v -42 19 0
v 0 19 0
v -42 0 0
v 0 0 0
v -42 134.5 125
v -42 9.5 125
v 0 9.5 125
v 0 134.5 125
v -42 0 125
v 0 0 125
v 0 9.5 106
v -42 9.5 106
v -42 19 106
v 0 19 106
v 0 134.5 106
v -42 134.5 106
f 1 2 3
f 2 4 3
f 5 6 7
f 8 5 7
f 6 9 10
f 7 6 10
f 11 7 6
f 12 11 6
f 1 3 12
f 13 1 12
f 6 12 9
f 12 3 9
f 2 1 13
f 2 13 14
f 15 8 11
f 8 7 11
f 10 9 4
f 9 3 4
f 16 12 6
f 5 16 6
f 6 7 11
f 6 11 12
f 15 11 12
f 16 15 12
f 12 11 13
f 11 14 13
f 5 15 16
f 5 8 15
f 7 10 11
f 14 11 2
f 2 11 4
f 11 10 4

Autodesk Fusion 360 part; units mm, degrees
sketch "First piece" plane through (0, 0, 0) normal (0, 1, 0) x (1, 0, 0)
  line L0 (0, 0) -> (-42, 0)
  line L1 (-42, 0) -> (-42, -125)
  line L2 (-42, -125) -> (0, -125)
  line L3 (0, -125) -> (0, 0)
  dimension "d6" = 42
  dimension "d7" = 125
extrude "Extrude1" add sketch "First piece" along normal blind 19 makes body 1
sketch "Cut" plane through (0, 19, 0) normal (0, 1, 0) x (-1, 0, 0)
  line L0 (0, 125) -> (0, 0)
  line L1 (0, 0) -> (42, 0)
  line L2 (42, 0) -> (42, 125)
  line L3 (42, 125) -> (0, 125)
  line L4 (42, 125) -> (0, 125)
  line L5 (0, 125) -> (0, 106)
  line L6 (0, 106) -> (42, 106)
  line L7 (42, 106) -> (42, 125)
  dimension "d10" = 42
  dimension "d11" = 19
extrude "Extrude2" cut sketch "Cut" against normal blind 9.5 contours L0 L2 L3 L4 L5 L6 L7 bodies 1
copy_body "Body->Comp1" bodies 1 removing the originals makes body 2 in component "First Piece"
sketch "Second Piece" plane through (0, 9.5, 0) normal (0, 1, 0) x (-1, 0, 0)
  line L0 (42, 106) -> (42, 125)
  line L1 (42, 125) -> (0, 125)
  line L2 (0, 125) -> (0, 106)
  line L3 (0, 106) -> (42, 106)
  line L4 (0, 125) -> (42, 125)
  line L5 (42, 125) -> (42, 106)
  line L6 (42, 106) -> (0, 106)
  line L7 (0, 106) -> (0, 125)
extrude "Extrude1'" add sketch "Second Piece" along normal blind 125 separate body makes body 3 in component "Second Piece"
component "First Piece" placed x (1, 0, 0) y (0, 1, 0) z (0, 0, 1) at (0, 0, 0)
component "Second Piece" placed x (1, 0, 0) y (0, 1, 0) z (0, 0, 1) at (0, 0, 0)
equation "lenght = 125 mm"
equation "width = 42 mm"
equation "thickness = 19 mm"
equation "d6 = width"
equation "d7 = lenght"
equation "d8 = thickness"
equation "d10 = width"
equation "d11 = thickness"
equation "d12 = -thickness / 2"
equation "d14 = lenght"
